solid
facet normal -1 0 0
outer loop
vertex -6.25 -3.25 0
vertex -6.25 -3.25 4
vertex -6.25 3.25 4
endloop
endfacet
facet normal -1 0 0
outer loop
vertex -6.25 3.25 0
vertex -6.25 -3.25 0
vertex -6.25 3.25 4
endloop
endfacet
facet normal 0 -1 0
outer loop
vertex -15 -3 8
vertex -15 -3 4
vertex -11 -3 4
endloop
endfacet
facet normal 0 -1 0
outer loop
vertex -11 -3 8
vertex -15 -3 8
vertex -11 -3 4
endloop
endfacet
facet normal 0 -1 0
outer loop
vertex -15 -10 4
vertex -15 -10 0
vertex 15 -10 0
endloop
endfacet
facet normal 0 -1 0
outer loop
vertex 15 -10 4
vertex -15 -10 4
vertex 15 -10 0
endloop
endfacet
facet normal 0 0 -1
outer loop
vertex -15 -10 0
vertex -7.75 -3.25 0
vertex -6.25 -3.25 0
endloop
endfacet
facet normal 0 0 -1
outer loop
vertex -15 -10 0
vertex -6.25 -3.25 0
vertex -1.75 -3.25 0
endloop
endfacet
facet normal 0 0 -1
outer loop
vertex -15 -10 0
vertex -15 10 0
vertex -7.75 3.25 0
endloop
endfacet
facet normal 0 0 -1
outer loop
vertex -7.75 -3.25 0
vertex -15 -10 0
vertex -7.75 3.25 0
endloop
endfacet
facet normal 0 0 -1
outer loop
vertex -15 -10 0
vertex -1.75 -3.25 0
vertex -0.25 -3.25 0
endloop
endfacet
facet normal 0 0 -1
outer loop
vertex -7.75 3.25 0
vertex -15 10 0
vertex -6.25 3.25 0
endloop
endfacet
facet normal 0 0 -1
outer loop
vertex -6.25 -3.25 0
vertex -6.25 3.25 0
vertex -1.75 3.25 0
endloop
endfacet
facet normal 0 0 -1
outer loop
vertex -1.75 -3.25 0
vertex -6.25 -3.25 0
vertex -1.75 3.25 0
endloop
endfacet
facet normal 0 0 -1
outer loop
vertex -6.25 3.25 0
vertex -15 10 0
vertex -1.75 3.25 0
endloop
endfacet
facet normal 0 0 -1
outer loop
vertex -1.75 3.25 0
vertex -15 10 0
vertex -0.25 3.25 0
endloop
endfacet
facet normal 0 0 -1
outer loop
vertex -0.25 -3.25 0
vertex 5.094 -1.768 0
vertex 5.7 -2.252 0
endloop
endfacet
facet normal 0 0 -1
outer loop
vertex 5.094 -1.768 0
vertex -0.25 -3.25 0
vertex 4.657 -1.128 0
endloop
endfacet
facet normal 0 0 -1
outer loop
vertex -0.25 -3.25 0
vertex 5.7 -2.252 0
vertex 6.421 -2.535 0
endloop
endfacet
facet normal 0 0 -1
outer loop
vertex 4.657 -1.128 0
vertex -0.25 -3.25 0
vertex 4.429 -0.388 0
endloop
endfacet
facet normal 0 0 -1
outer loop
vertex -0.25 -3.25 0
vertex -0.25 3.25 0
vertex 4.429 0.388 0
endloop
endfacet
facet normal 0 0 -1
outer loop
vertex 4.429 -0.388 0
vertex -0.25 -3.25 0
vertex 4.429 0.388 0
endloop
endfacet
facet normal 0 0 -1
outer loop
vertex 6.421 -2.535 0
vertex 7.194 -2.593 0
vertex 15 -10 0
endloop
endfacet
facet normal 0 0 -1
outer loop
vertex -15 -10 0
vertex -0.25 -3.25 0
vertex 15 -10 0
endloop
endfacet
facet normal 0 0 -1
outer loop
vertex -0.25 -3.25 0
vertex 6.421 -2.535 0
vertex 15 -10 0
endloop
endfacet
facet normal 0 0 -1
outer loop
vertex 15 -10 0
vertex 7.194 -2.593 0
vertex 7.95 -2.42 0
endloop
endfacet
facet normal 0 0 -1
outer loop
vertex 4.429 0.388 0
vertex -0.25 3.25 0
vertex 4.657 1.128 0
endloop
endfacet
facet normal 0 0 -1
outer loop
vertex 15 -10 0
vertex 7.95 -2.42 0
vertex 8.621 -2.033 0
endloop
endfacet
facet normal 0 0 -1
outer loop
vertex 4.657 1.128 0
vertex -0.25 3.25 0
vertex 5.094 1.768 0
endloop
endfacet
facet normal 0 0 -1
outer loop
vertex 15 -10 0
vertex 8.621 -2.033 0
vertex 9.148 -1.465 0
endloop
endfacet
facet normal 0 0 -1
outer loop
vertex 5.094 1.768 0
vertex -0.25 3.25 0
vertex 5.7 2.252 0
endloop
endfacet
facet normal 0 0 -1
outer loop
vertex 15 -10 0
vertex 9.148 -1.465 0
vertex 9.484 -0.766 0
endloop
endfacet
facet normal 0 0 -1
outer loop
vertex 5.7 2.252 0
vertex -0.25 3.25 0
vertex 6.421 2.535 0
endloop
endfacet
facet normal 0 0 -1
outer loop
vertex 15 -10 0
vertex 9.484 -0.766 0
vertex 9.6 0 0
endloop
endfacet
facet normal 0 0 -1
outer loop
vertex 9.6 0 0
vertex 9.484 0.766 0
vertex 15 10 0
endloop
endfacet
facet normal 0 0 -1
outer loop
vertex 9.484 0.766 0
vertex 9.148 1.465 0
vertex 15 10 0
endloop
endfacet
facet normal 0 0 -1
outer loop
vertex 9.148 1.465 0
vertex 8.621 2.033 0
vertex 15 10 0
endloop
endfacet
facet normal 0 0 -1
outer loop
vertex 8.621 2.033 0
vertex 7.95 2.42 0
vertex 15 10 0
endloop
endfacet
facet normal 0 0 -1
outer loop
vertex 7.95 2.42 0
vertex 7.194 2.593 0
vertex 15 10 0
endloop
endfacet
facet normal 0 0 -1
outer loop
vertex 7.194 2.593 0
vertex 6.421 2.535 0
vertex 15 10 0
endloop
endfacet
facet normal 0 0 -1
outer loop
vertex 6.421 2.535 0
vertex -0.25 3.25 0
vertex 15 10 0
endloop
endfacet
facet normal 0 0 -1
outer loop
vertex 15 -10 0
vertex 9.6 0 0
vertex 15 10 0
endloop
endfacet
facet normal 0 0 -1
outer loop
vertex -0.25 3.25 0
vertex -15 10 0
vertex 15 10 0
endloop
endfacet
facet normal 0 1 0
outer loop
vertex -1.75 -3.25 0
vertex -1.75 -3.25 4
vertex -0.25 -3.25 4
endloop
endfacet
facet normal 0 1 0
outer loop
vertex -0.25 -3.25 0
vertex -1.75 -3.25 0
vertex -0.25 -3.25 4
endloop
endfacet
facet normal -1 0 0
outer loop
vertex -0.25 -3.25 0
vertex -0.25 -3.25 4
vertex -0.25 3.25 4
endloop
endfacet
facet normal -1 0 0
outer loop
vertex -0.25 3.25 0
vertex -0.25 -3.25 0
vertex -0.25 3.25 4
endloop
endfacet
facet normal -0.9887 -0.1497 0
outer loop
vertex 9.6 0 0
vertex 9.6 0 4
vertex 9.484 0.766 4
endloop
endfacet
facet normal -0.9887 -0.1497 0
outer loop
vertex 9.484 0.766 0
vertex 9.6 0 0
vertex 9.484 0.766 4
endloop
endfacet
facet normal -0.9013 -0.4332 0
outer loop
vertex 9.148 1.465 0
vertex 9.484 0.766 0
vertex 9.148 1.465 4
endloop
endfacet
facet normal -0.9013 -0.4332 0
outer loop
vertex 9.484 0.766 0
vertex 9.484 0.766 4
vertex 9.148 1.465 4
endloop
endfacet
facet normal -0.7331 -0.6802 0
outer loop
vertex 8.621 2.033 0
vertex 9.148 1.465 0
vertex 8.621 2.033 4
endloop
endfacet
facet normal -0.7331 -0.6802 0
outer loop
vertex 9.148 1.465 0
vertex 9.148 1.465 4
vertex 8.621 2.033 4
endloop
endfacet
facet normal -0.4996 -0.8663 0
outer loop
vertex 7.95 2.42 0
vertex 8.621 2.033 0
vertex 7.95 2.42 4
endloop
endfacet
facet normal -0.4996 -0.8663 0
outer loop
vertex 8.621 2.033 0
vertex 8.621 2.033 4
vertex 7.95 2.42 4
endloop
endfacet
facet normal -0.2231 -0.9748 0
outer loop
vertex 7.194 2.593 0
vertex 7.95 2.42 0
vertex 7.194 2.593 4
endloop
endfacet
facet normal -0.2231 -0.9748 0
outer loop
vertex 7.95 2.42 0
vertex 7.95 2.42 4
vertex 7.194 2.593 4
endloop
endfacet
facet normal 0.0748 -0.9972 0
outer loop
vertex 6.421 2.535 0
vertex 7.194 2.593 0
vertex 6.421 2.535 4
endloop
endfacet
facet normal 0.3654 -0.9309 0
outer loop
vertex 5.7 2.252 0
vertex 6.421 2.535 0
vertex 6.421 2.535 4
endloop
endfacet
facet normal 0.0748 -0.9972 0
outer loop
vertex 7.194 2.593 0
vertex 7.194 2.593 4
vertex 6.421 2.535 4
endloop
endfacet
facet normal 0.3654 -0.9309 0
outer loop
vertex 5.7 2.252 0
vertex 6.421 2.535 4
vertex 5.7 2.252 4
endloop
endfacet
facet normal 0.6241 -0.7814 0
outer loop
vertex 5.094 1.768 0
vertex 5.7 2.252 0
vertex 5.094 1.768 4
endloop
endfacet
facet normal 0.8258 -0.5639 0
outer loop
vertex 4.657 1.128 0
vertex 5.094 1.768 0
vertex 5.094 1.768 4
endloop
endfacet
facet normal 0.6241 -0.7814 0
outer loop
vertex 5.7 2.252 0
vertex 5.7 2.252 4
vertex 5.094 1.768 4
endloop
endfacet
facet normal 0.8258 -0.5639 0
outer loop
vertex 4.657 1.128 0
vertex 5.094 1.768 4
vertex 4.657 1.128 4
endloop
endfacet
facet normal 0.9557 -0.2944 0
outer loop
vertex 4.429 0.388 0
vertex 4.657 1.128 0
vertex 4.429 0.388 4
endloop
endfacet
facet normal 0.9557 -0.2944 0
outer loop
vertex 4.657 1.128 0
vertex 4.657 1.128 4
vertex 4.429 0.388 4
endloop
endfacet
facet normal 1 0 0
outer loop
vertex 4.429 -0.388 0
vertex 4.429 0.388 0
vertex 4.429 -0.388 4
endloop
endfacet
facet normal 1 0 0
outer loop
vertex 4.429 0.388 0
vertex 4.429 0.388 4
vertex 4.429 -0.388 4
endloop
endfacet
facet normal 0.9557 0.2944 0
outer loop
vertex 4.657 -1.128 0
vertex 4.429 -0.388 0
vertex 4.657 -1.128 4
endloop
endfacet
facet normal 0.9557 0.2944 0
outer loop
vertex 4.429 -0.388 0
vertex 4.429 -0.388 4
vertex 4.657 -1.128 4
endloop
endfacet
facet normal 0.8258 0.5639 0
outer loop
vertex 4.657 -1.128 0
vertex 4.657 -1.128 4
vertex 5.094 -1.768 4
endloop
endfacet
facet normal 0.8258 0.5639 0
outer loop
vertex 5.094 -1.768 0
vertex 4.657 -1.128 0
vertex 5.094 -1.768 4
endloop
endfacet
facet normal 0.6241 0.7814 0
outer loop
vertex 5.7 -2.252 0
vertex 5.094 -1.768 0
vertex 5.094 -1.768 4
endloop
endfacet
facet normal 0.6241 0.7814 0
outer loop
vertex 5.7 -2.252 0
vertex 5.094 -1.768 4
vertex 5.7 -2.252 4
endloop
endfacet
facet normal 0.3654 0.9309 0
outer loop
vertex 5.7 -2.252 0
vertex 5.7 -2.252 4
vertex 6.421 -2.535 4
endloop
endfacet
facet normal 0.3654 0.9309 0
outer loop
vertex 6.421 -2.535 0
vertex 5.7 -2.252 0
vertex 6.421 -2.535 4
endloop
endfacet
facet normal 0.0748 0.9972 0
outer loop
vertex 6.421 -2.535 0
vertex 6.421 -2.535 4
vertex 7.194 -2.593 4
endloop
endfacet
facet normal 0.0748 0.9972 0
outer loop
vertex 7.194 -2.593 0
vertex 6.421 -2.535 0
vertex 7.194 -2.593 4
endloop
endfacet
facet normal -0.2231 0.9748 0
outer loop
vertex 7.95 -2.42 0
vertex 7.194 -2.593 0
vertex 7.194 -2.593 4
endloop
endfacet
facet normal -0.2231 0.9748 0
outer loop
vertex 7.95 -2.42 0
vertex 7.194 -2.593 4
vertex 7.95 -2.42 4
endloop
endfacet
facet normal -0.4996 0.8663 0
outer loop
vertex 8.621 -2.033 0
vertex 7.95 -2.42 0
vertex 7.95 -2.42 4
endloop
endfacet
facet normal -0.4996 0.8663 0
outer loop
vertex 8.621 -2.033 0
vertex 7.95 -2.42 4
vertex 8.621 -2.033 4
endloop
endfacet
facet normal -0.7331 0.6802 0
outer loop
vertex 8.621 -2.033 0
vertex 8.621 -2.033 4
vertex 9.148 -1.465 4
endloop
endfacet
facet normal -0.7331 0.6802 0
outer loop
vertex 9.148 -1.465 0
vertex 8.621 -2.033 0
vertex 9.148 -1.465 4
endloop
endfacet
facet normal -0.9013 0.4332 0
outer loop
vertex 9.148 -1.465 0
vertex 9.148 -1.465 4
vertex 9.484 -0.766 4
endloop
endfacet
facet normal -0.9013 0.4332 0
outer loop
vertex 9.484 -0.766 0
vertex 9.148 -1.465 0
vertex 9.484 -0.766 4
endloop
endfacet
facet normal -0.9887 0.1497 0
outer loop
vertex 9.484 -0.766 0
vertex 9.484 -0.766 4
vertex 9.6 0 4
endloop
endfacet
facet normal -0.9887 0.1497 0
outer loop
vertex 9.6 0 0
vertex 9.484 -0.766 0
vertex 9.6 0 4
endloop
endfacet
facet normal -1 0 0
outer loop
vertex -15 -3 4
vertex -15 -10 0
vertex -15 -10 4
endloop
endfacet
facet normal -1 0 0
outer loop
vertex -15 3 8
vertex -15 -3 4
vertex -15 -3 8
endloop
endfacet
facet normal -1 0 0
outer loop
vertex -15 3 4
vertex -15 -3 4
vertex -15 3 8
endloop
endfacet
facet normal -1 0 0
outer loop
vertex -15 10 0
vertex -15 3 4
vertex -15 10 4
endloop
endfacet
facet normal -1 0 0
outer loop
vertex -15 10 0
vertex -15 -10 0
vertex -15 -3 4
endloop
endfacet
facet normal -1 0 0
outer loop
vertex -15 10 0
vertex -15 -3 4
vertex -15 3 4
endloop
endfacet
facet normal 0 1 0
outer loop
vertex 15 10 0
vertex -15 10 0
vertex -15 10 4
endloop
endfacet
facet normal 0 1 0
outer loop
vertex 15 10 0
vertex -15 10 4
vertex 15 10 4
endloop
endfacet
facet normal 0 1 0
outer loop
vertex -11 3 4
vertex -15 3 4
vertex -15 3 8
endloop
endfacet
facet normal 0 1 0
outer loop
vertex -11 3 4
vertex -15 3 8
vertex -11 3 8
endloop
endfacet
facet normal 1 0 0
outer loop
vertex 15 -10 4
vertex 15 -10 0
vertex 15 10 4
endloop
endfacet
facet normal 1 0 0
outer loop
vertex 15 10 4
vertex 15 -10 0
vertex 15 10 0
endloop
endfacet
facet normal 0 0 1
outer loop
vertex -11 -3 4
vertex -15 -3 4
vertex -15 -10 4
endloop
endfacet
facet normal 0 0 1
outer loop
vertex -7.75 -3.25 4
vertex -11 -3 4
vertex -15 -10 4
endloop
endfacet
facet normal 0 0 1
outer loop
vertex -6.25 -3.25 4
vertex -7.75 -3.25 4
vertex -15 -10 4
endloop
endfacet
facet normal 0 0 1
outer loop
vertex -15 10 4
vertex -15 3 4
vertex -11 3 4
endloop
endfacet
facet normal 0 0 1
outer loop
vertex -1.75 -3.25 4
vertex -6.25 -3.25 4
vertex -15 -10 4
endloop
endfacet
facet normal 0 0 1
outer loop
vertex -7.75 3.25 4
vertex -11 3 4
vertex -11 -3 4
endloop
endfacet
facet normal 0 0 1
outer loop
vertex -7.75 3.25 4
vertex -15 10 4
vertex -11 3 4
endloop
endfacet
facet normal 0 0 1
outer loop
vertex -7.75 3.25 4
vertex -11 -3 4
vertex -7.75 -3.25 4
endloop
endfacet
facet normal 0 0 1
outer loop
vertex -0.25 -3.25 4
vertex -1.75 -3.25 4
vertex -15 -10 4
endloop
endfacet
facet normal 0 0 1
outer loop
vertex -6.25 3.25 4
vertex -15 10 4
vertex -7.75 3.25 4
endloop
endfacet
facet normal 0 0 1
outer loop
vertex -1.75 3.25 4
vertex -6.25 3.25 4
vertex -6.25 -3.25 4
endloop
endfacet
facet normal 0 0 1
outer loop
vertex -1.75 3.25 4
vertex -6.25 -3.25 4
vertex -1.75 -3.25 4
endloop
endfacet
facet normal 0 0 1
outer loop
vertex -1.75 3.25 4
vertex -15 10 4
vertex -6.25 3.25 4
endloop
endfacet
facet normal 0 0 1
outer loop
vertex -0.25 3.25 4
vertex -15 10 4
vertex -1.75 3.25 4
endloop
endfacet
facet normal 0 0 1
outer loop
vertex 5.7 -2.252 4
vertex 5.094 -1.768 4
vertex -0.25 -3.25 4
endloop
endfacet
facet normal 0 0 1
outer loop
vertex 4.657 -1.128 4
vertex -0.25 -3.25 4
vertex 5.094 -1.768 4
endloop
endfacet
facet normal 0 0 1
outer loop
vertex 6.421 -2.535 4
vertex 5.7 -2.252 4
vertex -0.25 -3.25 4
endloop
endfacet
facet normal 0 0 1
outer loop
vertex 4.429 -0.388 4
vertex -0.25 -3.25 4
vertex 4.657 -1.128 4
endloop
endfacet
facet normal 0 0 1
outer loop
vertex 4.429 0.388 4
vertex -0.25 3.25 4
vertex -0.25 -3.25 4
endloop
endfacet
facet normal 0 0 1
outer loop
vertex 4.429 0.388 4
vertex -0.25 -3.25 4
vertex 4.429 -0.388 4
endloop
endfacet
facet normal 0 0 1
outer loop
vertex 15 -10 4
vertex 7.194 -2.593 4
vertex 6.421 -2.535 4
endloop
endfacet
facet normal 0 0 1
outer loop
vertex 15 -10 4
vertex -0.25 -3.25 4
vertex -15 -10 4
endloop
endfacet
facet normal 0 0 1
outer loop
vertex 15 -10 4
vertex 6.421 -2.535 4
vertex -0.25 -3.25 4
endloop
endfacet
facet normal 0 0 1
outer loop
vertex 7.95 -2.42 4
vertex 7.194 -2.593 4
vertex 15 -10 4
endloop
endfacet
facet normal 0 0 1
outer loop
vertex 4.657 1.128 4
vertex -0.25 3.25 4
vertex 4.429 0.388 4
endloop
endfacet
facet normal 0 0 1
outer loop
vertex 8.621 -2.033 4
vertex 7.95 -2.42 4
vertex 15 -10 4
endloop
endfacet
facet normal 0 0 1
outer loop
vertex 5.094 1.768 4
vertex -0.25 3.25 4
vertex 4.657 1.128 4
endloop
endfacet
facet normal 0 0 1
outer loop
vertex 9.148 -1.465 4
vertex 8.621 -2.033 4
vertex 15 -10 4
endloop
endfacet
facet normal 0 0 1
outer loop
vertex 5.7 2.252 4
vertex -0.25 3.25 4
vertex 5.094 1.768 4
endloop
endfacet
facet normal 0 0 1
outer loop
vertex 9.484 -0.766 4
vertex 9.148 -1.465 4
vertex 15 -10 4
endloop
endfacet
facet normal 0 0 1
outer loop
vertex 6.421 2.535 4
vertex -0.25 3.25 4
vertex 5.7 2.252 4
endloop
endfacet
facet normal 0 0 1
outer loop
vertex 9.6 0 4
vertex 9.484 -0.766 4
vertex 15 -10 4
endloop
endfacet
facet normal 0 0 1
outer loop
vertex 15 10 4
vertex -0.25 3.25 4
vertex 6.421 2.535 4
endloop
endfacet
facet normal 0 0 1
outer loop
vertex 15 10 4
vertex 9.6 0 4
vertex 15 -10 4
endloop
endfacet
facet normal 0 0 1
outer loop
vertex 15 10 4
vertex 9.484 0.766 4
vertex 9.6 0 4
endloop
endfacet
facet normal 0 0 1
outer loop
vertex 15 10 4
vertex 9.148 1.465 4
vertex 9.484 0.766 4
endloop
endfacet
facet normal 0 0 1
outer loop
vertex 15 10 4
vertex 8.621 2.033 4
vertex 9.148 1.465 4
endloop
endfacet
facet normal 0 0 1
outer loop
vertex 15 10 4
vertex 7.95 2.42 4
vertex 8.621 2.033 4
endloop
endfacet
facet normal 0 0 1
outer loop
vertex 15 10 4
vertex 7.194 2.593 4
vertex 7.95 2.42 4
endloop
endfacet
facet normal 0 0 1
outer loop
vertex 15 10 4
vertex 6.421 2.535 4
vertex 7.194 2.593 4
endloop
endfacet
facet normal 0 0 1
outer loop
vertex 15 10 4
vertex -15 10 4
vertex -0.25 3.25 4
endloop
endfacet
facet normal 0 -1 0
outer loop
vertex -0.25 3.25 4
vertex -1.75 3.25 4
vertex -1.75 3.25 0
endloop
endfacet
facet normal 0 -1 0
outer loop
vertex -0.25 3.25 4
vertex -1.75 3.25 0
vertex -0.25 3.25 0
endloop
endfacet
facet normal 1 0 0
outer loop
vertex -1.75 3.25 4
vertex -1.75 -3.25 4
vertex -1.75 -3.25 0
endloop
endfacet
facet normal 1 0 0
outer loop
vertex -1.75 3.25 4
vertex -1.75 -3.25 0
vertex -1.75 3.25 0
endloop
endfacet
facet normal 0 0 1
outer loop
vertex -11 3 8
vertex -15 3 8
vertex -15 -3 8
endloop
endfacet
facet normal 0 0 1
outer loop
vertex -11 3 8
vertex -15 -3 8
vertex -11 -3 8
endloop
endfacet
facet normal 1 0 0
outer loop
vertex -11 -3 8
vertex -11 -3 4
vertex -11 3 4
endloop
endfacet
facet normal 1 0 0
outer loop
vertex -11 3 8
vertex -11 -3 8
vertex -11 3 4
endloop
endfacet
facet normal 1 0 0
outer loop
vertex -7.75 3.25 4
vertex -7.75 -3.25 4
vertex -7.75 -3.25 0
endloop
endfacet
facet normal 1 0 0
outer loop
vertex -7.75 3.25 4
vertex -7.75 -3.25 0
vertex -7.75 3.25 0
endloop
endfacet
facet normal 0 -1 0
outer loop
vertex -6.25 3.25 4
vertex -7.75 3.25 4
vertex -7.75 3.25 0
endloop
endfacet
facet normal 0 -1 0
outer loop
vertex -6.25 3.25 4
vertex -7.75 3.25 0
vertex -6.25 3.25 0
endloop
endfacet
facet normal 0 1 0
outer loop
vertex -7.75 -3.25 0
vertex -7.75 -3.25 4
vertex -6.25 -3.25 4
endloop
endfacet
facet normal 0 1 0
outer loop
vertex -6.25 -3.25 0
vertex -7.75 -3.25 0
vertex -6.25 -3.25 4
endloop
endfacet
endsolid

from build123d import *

# Parameters (mm, degrees)
F0_W     = 30
F0_H     = 20
F1_DEPTH = 4
F2_R     = 2.6
F2_W     = 1.5
F2_H     = 6.5
F3_DEPTH = 4.001
F4_W     = 4
F4_H     = 6
F5_DEPTH = 4


with BuildPart() as f1:
    # F0 (on Top) → F1 (new body)
    with BuildSketch(Plane.XY):
        Rectangle(F0_W, F0_H)
    extrude(amount=F1_DEPTH)

    # F2 (on face) → F3 (cut, through all)
    with BuildSketch(Plane.XY.offset(4)):
        with Locations((7, 0)):
            Circle(F2_R)
        with Locations((-1, 0)):
            Rectangle(F2_W, F2_H)
        with Locations((-7, 0)):
            Rectangle(F2_W, F2_H)
    extrude(amount=-F3_DEPTH, mode=Mode.SUBTRACT)

    # F4 (on face) → F5 (join)
    with BuildSketch(Plane.XY.offset(4)):
        with Locations((-13, 0)):
            Rectangle(F4_W, F4_H)
    extrude(amount=F5_DEPTH)


solid = f1.part
